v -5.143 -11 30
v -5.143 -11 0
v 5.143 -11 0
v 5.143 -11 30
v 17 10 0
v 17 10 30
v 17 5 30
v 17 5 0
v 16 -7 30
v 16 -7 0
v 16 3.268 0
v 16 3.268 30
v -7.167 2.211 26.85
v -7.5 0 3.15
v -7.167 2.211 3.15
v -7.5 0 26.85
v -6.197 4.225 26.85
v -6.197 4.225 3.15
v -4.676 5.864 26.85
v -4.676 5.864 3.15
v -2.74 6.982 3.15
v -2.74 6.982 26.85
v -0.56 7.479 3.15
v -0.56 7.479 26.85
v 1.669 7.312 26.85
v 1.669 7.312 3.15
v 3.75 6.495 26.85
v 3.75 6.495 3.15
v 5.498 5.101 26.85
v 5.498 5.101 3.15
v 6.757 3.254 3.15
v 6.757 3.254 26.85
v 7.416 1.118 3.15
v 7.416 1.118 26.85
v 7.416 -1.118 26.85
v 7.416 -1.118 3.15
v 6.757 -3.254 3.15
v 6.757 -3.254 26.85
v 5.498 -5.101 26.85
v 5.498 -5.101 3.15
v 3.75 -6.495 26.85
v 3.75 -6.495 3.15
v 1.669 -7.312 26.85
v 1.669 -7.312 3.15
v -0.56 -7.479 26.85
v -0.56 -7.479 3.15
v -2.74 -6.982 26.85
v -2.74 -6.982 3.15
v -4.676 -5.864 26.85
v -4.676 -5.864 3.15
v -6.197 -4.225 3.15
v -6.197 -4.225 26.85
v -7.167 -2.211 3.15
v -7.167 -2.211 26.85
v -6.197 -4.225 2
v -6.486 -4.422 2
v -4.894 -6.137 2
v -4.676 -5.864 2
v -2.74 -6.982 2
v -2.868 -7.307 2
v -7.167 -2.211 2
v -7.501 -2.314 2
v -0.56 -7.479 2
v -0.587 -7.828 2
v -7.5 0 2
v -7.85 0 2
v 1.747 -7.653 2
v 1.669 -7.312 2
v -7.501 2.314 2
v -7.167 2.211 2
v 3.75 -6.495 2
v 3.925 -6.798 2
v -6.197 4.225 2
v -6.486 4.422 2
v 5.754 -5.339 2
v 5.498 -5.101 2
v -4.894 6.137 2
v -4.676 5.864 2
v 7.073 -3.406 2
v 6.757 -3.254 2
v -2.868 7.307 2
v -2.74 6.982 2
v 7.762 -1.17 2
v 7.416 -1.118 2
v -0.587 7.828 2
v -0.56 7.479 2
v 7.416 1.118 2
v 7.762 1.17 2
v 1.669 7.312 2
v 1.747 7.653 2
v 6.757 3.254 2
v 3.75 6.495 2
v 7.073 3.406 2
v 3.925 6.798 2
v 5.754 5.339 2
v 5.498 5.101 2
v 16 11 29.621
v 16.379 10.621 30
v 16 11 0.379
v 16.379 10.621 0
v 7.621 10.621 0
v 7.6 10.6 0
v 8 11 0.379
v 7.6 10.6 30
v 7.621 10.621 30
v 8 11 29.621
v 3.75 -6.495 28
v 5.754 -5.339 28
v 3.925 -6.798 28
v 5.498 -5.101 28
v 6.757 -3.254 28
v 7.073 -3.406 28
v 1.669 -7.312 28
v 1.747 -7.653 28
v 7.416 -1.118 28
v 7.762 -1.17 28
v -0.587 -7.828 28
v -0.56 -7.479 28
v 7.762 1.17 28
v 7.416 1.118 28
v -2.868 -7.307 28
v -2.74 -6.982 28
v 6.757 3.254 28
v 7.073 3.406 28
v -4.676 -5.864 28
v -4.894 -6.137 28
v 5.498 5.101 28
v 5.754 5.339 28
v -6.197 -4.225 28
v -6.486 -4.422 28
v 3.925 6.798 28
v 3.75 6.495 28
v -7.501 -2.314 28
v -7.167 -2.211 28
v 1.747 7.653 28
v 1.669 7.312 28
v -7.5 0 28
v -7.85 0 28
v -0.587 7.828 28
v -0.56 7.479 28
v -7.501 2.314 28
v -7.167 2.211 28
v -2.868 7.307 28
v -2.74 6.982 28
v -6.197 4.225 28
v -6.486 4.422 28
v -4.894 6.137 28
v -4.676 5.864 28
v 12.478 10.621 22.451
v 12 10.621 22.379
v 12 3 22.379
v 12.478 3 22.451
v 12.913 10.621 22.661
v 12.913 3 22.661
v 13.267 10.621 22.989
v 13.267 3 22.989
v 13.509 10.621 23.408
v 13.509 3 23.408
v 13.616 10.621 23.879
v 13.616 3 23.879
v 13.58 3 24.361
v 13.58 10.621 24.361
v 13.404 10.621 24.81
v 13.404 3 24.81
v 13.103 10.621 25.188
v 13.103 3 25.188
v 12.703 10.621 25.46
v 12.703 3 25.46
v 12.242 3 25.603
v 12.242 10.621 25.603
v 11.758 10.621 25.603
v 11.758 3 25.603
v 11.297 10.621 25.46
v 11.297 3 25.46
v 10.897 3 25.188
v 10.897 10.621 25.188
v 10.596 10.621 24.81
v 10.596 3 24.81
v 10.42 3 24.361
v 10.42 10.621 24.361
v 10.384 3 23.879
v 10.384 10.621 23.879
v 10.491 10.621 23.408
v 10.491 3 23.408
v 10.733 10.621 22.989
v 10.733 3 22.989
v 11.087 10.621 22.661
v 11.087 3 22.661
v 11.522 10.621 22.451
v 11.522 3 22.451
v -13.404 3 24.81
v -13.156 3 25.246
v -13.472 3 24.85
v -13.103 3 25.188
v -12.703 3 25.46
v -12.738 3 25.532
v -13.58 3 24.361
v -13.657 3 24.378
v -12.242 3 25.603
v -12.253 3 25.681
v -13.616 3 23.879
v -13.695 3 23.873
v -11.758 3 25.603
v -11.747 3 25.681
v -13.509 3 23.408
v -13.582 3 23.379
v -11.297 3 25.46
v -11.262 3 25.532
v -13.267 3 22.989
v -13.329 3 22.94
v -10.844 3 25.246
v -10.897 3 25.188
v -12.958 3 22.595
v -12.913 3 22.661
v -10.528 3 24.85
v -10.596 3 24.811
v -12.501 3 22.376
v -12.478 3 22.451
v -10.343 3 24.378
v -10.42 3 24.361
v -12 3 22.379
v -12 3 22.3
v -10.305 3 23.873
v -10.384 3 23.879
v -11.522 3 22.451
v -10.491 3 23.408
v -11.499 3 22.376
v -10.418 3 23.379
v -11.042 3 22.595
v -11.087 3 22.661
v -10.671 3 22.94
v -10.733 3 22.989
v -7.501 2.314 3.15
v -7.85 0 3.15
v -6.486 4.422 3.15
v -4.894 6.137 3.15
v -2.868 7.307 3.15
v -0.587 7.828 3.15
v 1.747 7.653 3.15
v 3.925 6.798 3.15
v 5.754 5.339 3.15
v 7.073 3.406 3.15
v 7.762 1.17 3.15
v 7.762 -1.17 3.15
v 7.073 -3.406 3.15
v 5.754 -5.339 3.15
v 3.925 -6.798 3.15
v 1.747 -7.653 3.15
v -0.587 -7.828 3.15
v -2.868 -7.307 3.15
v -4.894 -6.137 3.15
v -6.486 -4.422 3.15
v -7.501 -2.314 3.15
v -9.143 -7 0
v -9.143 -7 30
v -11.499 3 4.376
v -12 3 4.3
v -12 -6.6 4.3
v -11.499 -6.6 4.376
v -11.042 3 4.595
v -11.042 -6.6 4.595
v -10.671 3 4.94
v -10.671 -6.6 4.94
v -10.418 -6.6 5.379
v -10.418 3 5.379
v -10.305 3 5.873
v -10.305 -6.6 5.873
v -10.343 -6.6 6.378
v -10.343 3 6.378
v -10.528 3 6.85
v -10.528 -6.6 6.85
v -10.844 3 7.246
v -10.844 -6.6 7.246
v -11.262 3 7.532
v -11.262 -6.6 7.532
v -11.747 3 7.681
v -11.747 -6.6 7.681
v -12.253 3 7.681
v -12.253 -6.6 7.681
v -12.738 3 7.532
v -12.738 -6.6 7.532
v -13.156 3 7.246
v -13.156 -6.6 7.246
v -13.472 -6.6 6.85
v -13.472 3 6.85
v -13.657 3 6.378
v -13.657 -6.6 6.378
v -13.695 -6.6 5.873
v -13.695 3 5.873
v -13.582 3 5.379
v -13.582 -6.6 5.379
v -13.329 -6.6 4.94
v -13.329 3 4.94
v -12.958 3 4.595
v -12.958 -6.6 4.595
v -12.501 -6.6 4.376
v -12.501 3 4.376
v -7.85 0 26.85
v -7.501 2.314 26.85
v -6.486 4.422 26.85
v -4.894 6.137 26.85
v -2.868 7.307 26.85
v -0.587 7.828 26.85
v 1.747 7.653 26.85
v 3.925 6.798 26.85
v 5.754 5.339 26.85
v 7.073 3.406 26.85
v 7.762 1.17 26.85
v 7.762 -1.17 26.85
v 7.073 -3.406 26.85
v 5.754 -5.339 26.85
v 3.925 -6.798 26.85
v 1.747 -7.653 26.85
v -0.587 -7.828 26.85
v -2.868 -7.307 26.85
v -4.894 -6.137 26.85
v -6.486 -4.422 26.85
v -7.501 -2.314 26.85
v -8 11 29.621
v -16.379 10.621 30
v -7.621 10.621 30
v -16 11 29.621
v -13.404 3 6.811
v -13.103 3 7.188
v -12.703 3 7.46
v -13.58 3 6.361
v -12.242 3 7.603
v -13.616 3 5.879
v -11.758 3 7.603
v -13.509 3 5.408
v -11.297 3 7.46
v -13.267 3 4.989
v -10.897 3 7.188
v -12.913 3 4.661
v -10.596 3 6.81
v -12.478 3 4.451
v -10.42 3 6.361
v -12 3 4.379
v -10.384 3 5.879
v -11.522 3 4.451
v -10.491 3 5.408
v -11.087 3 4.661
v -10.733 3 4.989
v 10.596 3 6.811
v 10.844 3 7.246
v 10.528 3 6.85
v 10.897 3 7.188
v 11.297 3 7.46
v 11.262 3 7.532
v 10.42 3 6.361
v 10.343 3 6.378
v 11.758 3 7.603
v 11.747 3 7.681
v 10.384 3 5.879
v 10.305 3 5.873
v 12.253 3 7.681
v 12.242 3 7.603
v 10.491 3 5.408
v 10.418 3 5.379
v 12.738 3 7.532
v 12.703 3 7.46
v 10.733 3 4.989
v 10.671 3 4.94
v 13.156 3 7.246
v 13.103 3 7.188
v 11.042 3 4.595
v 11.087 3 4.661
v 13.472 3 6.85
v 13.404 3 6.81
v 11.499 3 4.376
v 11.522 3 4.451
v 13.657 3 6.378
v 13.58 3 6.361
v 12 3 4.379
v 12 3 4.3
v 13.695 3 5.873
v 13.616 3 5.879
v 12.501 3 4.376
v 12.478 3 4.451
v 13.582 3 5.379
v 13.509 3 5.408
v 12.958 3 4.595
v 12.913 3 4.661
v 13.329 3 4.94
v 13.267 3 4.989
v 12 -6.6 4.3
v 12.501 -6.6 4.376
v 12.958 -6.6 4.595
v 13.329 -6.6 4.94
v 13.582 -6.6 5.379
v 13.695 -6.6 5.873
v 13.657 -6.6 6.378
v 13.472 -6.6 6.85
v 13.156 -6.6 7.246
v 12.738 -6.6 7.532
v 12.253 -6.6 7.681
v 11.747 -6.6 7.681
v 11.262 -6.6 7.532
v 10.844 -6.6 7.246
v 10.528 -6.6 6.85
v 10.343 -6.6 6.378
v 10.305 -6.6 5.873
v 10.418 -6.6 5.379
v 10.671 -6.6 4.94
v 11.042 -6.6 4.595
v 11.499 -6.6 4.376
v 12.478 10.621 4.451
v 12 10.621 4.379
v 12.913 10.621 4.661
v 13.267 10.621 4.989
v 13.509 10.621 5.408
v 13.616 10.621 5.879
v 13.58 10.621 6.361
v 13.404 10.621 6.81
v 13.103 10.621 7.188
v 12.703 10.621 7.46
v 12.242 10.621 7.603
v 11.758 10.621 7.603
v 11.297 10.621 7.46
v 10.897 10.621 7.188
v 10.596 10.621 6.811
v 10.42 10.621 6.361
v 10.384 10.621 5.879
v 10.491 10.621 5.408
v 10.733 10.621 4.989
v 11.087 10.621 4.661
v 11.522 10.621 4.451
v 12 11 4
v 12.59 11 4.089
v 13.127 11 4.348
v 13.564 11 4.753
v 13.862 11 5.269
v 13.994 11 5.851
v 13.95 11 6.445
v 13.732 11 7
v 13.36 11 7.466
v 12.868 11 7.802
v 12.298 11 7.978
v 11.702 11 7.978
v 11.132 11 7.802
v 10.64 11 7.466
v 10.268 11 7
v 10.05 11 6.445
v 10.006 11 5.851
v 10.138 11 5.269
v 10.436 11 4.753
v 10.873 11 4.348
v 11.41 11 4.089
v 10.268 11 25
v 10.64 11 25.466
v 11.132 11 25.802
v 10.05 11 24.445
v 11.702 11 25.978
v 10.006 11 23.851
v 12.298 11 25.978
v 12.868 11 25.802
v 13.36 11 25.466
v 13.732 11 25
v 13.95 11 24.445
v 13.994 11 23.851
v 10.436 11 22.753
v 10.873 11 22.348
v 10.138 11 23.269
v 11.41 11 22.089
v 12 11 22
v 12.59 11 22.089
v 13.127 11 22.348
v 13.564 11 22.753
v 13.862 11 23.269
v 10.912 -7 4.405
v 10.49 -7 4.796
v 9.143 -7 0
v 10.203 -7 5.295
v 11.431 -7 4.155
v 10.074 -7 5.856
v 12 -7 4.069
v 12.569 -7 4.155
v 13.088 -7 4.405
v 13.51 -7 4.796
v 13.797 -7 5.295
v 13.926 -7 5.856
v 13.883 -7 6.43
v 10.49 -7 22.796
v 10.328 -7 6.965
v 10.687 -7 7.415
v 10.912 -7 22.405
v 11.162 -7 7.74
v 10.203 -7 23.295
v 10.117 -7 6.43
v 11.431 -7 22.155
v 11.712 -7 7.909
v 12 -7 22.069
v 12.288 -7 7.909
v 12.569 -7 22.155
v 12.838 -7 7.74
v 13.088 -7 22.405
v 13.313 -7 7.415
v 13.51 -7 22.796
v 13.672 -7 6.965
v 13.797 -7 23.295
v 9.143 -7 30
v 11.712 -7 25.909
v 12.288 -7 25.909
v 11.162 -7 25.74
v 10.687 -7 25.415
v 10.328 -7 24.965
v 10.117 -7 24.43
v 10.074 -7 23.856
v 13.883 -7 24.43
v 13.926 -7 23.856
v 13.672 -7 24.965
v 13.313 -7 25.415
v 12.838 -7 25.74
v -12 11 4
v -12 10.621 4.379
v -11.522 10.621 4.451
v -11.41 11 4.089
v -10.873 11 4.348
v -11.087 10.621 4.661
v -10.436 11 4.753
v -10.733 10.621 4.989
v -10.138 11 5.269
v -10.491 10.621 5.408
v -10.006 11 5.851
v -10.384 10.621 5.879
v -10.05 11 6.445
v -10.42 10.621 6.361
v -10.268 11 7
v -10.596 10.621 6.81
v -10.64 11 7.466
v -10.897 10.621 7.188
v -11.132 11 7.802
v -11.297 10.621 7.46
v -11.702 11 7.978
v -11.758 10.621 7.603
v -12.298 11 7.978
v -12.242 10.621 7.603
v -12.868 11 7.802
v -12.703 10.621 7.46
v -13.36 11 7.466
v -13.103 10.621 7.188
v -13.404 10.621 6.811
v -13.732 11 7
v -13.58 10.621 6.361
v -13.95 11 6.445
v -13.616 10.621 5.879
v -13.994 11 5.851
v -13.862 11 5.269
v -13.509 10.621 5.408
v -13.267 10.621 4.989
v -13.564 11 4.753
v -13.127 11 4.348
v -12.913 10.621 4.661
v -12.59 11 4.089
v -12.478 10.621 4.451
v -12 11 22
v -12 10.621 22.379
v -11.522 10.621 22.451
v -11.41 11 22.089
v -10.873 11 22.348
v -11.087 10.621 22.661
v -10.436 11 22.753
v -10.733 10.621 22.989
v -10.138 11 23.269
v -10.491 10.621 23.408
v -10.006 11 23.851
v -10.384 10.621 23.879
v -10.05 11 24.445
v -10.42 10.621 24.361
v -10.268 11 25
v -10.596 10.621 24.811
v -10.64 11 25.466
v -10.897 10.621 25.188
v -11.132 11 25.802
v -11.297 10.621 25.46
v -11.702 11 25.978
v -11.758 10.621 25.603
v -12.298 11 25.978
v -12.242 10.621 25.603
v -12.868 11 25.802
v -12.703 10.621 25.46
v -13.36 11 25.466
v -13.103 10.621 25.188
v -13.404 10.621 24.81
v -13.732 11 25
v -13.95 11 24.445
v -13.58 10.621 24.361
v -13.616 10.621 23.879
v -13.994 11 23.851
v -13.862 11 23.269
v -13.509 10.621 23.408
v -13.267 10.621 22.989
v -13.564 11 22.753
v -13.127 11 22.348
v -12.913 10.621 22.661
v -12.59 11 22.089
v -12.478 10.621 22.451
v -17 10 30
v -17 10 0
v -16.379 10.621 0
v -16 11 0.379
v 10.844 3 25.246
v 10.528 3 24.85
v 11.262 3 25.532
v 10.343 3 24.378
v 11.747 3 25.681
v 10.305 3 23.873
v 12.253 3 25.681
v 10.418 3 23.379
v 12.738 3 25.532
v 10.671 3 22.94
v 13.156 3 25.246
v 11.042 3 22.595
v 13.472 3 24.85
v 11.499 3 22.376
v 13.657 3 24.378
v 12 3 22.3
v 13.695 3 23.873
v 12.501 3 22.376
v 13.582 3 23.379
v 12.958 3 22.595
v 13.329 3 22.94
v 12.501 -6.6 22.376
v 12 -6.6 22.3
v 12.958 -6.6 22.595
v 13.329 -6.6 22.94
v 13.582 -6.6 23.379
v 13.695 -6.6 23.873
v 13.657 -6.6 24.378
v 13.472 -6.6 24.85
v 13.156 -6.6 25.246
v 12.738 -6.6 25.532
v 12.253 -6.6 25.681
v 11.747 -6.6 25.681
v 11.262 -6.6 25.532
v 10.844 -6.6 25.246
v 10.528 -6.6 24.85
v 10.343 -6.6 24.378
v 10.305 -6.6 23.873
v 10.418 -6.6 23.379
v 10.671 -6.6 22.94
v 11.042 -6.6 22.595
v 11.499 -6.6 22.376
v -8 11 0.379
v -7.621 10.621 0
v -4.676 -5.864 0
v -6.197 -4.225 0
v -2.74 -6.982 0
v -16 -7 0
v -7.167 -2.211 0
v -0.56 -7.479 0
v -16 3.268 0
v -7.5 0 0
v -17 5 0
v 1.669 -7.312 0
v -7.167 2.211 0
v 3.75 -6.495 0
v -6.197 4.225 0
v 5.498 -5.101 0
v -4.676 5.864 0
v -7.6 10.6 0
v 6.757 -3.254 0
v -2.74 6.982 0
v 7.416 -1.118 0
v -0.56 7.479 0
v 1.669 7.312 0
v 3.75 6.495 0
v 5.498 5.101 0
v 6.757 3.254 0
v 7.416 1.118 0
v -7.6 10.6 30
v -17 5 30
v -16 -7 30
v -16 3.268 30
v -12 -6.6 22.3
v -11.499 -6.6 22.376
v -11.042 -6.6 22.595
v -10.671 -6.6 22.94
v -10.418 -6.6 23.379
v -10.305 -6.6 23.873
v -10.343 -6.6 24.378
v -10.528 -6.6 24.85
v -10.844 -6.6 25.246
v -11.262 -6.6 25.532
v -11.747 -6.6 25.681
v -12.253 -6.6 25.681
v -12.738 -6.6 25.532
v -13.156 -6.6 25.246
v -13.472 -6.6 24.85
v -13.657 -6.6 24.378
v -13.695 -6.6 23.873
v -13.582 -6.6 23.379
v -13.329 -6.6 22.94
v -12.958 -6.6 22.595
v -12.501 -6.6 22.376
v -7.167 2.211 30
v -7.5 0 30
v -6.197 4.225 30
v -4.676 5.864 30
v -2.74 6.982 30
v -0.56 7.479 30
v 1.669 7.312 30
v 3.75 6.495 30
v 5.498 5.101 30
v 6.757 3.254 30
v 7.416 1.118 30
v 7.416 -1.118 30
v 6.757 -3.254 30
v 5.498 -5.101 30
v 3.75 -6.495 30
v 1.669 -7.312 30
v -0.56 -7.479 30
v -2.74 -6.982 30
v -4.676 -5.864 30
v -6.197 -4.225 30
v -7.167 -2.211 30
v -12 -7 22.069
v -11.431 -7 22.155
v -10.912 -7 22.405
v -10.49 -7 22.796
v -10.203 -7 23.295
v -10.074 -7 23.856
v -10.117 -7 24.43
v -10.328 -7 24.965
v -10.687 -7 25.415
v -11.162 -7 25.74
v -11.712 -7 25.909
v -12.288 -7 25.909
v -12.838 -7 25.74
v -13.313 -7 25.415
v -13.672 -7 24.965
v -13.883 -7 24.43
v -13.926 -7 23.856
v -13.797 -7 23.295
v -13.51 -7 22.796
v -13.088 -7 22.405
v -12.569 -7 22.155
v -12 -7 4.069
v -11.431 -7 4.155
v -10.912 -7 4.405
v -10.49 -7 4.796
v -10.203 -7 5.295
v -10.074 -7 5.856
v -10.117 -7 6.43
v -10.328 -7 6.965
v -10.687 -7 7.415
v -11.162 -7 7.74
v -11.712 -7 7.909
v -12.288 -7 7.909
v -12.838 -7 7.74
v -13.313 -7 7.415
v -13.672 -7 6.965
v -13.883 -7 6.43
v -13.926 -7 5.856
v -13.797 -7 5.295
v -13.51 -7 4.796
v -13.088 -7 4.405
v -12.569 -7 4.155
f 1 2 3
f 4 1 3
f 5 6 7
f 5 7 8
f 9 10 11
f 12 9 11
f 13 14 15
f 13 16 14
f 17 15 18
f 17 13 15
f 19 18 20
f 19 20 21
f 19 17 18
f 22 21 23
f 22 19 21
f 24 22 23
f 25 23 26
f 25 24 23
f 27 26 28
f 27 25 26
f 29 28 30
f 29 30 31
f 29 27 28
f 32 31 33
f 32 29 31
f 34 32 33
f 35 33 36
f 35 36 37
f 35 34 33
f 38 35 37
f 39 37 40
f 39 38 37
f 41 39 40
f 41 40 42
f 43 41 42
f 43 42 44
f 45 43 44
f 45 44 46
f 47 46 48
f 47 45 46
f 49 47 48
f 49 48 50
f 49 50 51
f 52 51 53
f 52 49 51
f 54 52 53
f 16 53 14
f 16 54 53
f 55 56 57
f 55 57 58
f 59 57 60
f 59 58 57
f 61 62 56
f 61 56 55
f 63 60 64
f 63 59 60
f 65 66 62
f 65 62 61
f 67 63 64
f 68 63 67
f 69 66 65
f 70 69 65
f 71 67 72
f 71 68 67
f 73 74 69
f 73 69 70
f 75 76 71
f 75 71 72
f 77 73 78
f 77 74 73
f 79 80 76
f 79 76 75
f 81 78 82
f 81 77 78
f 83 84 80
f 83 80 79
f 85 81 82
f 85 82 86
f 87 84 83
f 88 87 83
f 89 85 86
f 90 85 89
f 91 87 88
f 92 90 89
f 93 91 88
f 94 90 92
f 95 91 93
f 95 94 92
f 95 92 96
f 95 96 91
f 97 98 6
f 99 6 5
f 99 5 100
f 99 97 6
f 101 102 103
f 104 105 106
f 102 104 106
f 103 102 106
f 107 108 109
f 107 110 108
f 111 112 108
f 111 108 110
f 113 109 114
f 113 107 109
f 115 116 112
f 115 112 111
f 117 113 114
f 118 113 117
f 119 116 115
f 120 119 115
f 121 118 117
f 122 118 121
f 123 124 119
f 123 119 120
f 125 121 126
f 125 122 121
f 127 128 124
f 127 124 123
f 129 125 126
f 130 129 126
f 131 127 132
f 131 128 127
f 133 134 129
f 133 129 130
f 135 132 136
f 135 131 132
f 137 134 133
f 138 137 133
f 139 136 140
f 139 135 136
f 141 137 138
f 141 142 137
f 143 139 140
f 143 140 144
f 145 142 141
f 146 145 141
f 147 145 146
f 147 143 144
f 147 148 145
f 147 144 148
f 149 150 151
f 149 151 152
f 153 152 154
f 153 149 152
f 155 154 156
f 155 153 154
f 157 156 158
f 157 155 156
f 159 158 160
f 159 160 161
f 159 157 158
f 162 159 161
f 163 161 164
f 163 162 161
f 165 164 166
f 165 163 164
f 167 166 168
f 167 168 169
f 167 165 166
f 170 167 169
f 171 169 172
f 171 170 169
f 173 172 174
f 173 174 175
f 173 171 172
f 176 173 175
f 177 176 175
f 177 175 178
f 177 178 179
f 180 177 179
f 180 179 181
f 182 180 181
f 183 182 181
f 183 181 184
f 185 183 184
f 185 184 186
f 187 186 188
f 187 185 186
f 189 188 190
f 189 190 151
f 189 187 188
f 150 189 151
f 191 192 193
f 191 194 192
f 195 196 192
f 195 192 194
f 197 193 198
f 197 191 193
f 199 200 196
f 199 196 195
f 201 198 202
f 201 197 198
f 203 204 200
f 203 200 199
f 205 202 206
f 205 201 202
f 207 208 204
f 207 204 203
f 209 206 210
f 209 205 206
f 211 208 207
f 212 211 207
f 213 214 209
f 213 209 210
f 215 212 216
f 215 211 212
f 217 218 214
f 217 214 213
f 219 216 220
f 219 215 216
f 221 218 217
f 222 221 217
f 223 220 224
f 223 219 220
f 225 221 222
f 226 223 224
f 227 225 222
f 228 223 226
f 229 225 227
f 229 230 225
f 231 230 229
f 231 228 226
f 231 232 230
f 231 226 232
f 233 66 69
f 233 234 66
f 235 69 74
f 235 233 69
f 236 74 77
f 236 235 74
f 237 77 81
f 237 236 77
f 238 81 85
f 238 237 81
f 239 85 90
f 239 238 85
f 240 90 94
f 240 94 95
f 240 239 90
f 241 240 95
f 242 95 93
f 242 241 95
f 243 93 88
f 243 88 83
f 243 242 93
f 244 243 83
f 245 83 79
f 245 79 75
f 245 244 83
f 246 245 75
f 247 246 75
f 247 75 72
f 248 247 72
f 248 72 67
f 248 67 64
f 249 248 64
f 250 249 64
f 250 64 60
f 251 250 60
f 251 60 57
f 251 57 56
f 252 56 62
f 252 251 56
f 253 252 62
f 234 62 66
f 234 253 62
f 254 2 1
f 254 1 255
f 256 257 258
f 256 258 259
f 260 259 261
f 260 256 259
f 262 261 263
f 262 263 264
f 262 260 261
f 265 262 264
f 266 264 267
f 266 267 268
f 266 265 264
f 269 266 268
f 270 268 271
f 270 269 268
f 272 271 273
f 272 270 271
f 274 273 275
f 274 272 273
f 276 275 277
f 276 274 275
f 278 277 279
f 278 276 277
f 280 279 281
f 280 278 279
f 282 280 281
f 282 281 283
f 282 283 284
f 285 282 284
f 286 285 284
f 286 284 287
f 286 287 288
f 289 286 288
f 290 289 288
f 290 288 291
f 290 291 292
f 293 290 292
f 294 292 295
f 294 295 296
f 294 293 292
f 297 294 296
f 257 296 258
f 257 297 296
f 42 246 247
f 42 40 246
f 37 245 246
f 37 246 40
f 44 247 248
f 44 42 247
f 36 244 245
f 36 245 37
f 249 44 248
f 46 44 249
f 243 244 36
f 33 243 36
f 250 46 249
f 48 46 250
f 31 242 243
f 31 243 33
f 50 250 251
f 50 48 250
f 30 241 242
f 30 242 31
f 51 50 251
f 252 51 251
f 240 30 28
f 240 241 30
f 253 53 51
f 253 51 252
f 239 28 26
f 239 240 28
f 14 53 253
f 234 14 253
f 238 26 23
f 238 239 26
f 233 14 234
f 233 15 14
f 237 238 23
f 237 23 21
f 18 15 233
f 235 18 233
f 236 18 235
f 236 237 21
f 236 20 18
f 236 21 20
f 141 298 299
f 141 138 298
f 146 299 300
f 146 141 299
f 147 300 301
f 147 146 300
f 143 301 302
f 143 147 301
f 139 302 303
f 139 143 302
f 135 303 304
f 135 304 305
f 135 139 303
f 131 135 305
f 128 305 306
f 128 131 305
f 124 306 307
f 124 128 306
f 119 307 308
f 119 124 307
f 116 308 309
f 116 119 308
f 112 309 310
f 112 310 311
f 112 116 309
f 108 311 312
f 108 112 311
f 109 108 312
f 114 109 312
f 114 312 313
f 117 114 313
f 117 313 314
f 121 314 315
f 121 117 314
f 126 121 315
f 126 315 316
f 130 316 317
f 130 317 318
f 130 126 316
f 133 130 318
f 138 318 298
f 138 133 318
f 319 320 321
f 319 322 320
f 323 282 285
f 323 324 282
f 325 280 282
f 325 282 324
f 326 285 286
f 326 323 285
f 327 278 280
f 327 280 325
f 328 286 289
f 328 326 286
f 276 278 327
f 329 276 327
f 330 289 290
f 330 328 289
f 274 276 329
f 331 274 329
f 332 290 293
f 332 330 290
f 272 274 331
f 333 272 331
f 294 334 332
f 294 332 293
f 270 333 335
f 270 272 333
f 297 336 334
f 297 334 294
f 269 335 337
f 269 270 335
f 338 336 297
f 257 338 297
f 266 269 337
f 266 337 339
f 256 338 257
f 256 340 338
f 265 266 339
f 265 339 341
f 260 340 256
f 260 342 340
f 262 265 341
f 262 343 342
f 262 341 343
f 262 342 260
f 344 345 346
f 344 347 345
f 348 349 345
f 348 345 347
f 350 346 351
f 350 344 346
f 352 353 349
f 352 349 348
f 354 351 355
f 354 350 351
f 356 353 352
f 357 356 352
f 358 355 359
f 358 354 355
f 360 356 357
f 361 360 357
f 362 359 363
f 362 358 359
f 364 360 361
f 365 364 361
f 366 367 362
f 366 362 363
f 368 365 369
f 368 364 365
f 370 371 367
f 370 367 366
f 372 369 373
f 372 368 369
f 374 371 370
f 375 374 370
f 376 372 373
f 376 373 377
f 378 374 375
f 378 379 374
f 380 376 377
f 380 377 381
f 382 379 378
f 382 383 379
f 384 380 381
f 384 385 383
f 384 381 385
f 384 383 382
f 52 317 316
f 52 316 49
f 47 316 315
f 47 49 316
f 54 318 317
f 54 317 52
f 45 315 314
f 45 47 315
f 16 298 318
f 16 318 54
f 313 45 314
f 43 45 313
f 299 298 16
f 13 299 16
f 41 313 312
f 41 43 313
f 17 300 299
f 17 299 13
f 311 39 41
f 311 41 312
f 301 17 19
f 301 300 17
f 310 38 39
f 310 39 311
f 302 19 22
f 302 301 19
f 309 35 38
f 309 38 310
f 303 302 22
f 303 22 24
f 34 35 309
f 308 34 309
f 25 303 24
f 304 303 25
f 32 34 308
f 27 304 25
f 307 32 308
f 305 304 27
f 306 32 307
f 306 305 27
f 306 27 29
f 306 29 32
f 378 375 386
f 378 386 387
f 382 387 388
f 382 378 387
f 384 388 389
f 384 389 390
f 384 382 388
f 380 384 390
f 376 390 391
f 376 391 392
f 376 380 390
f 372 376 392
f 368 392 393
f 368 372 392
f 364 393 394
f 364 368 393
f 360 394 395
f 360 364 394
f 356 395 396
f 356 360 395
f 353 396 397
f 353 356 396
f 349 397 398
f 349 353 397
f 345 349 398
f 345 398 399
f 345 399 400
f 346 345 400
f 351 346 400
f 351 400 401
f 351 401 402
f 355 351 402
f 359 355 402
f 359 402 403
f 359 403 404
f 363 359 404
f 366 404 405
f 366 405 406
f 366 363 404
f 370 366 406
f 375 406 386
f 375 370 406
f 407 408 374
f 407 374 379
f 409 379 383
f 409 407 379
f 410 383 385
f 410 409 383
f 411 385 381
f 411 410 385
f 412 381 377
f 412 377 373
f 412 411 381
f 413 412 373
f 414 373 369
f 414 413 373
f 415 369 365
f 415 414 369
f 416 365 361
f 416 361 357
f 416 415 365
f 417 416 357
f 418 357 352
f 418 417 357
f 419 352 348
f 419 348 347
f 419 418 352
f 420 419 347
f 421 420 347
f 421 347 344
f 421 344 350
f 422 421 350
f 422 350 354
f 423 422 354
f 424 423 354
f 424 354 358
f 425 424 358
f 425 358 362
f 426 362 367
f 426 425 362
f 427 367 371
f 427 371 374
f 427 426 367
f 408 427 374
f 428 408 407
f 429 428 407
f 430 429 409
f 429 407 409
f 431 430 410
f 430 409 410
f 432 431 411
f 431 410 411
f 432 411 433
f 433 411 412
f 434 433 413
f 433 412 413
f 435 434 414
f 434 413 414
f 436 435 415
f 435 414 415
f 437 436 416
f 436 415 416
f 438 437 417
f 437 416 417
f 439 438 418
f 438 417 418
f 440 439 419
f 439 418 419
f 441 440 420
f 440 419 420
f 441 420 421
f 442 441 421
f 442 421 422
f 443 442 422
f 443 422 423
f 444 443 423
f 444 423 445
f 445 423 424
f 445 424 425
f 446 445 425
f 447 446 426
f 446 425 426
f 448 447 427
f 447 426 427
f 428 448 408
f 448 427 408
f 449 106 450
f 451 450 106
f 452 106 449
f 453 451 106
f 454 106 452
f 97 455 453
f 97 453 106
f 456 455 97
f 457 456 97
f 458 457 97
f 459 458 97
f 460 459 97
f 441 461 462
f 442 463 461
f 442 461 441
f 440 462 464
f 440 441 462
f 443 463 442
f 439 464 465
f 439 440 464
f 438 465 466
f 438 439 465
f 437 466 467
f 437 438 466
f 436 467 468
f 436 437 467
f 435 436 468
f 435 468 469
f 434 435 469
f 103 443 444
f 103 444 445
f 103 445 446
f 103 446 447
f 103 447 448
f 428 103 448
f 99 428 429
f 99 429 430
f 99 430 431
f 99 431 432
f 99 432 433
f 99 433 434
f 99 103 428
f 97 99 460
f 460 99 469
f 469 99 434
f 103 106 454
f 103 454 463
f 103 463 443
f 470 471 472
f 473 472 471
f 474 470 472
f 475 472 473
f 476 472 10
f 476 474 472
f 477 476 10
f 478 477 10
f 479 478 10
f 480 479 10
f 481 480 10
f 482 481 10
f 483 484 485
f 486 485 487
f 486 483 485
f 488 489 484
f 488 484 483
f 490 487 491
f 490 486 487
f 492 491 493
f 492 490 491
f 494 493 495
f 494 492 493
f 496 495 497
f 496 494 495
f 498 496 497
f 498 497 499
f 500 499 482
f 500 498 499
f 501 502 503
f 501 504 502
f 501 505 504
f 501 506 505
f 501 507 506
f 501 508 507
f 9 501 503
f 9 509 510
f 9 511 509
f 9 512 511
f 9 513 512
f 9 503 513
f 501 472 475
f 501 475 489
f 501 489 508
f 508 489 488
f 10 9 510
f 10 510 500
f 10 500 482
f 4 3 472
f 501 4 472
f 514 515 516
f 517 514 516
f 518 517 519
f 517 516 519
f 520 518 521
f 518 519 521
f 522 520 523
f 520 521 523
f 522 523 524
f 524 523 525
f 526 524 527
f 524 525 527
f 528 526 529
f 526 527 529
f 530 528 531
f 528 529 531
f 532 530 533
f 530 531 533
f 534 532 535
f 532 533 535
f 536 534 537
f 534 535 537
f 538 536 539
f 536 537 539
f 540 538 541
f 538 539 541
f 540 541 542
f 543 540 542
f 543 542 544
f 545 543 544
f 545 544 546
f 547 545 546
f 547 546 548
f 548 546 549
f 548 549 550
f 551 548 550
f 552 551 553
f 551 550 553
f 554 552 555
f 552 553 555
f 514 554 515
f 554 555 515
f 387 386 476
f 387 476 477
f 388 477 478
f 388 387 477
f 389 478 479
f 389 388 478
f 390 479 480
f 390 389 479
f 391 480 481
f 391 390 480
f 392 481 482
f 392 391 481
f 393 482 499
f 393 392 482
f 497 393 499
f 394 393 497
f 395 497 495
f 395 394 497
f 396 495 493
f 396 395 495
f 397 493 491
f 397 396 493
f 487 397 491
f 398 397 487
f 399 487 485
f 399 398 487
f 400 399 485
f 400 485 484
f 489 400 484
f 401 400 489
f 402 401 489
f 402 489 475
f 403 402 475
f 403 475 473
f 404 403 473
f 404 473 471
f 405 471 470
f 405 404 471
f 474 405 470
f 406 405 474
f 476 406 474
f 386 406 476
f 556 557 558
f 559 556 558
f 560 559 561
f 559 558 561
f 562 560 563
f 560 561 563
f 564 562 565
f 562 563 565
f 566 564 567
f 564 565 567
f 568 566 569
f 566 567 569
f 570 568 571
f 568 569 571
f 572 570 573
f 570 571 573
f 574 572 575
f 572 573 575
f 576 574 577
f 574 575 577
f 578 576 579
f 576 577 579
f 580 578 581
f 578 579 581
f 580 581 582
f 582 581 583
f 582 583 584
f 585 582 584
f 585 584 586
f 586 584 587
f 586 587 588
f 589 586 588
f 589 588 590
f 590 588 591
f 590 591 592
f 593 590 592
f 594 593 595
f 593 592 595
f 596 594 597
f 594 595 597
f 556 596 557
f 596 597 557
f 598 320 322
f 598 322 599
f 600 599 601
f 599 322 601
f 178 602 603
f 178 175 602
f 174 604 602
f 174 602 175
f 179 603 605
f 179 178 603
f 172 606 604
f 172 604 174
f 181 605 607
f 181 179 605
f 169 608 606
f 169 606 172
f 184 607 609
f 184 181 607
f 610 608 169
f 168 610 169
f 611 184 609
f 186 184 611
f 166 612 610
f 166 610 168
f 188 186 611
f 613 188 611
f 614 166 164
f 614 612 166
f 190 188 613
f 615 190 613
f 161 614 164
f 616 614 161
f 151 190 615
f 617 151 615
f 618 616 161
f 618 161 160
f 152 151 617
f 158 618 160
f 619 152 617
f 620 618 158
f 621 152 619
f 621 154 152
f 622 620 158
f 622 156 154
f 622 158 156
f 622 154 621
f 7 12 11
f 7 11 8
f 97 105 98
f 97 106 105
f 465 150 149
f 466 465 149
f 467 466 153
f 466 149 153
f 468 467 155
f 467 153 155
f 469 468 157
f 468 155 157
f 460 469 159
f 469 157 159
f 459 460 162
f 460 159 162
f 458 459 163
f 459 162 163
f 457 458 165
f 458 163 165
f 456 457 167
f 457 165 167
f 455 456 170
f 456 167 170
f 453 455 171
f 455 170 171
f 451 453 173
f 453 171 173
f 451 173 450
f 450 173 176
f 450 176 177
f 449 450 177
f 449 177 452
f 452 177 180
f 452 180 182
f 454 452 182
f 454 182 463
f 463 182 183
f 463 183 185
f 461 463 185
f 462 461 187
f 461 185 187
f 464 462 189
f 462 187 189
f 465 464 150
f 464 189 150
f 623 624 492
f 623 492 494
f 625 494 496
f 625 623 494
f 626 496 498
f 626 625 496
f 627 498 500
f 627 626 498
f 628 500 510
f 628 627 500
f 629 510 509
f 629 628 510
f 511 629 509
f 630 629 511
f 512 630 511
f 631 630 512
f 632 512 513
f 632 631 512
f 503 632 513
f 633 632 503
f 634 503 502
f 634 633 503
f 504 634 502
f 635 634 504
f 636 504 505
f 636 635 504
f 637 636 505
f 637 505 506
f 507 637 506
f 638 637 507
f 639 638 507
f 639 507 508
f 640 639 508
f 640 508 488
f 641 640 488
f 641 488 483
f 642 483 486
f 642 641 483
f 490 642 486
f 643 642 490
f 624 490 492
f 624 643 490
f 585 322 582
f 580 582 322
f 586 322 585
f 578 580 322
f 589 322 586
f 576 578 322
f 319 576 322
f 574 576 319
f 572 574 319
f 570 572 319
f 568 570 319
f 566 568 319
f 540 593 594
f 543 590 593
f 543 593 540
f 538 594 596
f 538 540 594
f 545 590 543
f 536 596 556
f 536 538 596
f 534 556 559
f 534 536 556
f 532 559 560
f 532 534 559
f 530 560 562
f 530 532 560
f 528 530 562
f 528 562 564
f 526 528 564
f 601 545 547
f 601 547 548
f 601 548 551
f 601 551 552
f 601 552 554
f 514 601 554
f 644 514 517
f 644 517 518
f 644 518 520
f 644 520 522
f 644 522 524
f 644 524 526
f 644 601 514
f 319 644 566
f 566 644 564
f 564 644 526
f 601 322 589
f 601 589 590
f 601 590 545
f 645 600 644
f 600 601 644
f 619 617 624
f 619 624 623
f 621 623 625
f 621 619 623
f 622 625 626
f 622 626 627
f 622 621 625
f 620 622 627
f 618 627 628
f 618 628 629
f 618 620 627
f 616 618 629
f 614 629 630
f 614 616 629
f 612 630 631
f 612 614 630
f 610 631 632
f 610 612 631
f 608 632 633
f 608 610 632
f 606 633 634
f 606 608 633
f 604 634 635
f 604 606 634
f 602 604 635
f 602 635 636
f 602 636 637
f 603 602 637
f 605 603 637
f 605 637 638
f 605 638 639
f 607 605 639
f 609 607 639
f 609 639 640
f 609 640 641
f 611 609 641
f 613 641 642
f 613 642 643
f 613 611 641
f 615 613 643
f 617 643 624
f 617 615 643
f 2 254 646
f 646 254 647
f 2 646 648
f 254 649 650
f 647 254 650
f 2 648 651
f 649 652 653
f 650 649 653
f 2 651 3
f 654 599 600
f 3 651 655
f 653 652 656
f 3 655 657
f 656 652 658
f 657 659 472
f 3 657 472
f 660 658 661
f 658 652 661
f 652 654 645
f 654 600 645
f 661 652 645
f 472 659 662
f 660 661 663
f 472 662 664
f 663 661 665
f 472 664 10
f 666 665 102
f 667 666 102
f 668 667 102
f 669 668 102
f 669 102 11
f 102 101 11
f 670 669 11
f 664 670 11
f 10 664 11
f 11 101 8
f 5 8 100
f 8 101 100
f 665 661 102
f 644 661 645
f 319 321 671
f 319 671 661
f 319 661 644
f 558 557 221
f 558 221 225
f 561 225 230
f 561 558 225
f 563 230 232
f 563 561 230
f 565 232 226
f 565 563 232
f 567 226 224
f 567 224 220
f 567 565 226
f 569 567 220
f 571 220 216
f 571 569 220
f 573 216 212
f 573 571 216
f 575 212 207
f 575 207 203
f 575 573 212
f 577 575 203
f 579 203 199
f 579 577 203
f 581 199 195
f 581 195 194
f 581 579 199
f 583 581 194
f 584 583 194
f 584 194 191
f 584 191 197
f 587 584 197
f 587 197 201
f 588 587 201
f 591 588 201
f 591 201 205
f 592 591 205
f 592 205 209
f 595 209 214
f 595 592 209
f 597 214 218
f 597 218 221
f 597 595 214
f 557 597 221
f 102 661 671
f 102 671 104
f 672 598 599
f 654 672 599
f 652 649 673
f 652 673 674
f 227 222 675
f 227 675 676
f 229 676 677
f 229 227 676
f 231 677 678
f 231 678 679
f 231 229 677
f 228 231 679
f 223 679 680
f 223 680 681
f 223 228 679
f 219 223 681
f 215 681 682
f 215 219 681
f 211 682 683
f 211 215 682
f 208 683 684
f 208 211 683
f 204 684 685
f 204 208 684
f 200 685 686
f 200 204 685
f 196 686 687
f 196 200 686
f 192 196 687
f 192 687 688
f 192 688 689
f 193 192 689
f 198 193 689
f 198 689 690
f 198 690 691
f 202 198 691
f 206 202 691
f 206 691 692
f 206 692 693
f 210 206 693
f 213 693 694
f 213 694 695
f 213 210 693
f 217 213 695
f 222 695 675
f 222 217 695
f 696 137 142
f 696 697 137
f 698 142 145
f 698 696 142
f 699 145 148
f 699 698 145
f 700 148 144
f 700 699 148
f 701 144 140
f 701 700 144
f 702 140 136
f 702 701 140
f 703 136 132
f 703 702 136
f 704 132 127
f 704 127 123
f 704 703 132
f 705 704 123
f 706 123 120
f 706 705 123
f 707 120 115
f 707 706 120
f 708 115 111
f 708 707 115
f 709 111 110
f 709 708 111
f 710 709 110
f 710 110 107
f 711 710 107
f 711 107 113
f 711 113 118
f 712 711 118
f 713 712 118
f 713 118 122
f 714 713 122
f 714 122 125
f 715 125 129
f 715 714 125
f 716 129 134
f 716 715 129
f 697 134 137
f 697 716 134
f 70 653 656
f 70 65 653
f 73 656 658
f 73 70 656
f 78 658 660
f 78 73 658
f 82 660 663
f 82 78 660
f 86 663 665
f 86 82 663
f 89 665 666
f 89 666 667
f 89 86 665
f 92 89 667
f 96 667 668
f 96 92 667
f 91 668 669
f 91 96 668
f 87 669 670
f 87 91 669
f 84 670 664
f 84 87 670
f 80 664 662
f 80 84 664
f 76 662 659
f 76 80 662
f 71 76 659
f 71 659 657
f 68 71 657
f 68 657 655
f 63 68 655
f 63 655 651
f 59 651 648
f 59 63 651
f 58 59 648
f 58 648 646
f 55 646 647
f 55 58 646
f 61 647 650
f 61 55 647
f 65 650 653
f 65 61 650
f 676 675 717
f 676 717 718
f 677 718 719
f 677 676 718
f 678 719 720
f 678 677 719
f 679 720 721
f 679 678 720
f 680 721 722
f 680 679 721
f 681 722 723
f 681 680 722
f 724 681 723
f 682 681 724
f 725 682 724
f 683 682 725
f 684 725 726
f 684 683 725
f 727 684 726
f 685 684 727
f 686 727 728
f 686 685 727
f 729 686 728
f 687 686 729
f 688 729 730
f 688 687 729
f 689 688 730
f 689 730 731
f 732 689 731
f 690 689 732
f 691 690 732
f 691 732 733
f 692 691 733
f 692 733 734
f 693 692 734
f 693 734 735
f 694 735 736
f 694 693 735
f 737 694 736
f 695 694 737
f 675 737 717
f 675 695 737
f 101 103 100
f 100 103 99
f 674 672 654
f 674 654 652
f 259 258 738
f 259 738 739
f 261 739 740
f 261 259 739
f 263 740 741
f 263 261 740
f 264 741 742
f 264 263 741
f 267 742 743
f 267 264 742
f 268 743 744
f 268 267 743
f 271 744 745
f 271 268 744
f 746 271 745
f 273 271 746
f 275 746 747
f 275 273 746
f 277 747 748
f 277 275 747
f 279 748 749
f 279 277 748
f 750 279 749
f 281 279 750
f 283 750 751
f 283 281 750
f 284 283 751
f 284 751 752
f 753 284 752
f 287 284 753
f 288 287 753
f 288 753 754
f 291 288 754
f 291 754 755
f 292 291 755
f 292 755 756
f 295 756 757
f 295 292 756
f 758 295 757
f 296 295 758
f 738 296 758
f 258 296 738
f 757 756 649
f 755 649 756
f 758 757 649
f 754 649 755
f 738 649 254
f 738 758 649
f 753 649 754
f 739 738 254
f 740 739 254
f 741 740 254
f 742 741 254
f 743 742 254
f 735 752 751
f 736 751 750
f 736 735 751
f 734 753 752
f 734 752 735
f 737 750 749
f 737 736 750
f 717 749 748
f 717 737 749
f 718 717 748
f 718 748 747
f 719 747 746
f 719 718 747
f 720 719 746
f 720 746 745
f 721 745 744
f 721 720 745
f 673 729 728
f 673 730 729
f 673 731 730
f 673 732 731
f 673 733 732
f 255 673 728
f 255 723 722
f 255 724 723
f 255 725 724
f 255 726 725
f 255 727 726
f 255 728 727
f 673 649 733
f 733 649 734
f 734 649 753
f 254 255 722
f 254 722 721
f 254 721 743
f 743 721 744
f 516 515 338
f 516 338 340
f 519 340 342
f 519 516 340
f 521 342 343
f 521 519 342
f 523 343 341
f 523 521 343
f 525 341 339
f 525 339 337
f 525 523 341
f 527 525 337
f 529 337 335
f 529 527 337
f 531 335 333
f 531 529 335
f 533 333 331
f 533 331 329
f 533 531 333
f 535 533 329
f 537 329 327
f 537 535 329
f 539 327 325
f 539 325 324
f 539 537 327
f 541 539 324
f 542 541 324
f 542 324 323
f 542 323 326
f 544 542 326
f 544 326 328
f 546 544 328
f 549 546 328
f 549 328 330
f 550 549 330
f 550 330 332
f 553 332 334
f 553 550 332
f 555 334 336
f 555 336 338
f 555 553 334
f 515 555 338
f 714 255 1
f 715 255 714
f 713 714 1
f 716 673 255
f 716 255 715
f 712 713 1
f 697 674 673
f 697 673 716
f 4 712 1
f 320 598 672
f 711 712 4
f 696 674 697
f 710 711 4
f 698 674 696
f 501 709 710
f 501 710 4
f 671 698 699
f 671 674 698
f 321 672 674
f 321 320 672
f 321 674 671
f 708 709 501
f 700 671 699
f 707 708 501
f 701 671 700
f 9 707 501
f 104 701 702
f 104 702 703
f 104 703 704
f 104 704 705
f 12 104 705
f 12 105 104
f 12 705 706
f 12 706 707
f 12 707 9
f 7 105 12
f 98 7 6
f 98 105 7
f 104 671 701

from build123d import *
from OCP.BRepFilletAPI import BRepFilletAPI_MakeChamfer

# Parameters (mm, degrees)
SCHIZZO1_W                   = 34
SCHIZZO1_H                   = 30
ESTRUSIONE_ESTRUSIONE1_DEPTH = 22
SCHIZZO2_W                   = 1
SCHIZZO2_H                   = 14.267949192
TAGLIO_ESTRUSIONE1_DEPTH     = 37.193922142
SCHIZZO3_W                   = 10.8571
SCHIZZO3_H                   = 4
TAGLIO_ESTRUSIONE2_DEPTH     = 37.193922142
SCHIZZO4_W                   = 11.8571
SCHIZZO4_H                   = 4
TAGLIO_ESTRUSIONE3_DEPTH     = 37.193922142
SCHIZZO5_W                   = 1
SCHIZZO5_H                   = 10.267949192
TAGLIO_ESTRUSIONE4_DEPTH     = 37.193922142
SCHIZZO6_W                   = 15.2
SCHIZZO6_H                   = 0.4
TAGLIO_ESTRUSIONE5_DEPTH     = 37.193922142
SFORMO1_ANGLE                = 60
SFORMO2_ANGLE                = 60
SFORMO3_ANGLE                = 45
SFORMO4_ANGLE                = 45
SMUSSO1_SIZE                 = 0.230940108
SMUSSO1_SIZE2                = 0.4
SMUSSO2_SIZE                 = 0.379
SMUSSO3_SIZE                 = 1


with BuildPart() as part:
    # Schizzo1 → Estrusione-Estrusione1 (new body)
    with BuildSketch(Plane(origin=(0, 11, 0), x_dir=(1, 0, 0), z_dir=(0, 1, 0))):
        with Locations((0, -15)):
            Rectangle(SCHIZZO1_W, SCHIZZO1_H)
    extrude(amount=-ESTRUSIONE_ESTRUSIONE1_DEPTH)

    # Schizzo2 → Taglio-Estrusione1 (cut, through all)
    with BuildSketch(Plane.XY.offset(30)):
        with Locations((16.5, -3.866025404)):
            Rectangle(SCHIZZO2_W, SCHIZZO2_H)
    extrude(amount=-TAGLIO_ESTRUSIONE1_DEPTH, mode=Mode.SUBTRACT)

    # Schizzo3 → Taglio-Estrusione2 (cut, through all)
    with BuildSketch(Plane.XY.offset(30)):
        with Locations((10.57145, -9)):
            Rectangle(SCHIZZO3_W, SCHIZZO3_H)
    extrude(amount=-TAGLIO_ESTRUSIONE2_DEPTH, mode=Mode.SUBTRACT)

    # Schizzo4 → Taglio-Estrusione3 (cut, through all)
    with BuildSketch(Plane.XY.offset(30)):
        with Locations((-11.07145, -9)):
            Rectangle(SCHIZZO4_W, SCHIZZO4_H)
    extrude(amount=-TAGLIO_ESTRUSIONE3_DEPTH, mode=Mode.SUBTRACT)

    # Schizzo5 → Taglio-Estrusione4 (cut, through all)
    with BuildSketch(Plane.XY.offset(30)):
        with Locations((-16.5, -1.866025404)):
            Rectangle(SCHIZZO5_W, SCHIZZO5_H)
    extrude(amount=-TAGLIO_ESTRUSIONE4_DEPTH, mode=Mode.SUBTRACT)

    # Schizzo6 → Taglio-Estrusione5 (cut, through all)
    with BuildSketch(Plane.XY.offset(30)):
        with Locations((0, 10.8)):
            Rectangle(SCHIZZO6_W, SCHIZZO6_H)
    extrude(amount=-TAGLIO_ESTRUSIONE5_DEPTH, mode=Mode.SUBTRACT)

    # Sformo1
    sformo1_faces = [part.faces().sort_by_distance(p)[0] for p in [
        (16.5, 3.267949192, 15),
    ]]
    draft(sformo1_faces, Plane(origin=(16, 3.267949192, 0), x_dir=(0, 0, 1), z_dir=(1, 0, 0)), SFORMO1_ANGLE)

    # Sformo2
    sformo2_faces = [part.faces().sort_by_distance(p)[0] for p in [
        (-16.5, 3.267949192, 15),
    ]]
    draft(sformo2_faces, Plane(origin=(-16, -7, 0), x_dir=(0, 0, -1), z_dir=(-1, 0, 0)), SFORMO2_ANGLE)

    # Sformo3
    sformo3_faces = [part.faces().sort_by_distance(p)[0] for p in [
        (5.1429, -9, 15),
        (-5.1429, -9, 15),
    ]]
    draft(sformo3_faces, Plane(origin=(0, -11, 0), x_dir=(0, 0, -1), z_dir=(0, -1, 0)), SFORMO3_ANGLE)

    # Sformo4
    sformo4_faces = [part.faces().sort_by_distance(p)[0] for p in [
        (-7.6, 10.8, 15),
        (7.6, 10.8, 15),
    ]]
    draft(sformo4_faces, Plane(origin=(-7.6, 10.6, 0), x_dir=(1, 0, 0), z_dir=(0, 1, 0)), SFORMO4_ANGLE)

    # Schizzo7 → Taglia-Rivoluzione1 (revolve, cut)
    with BuildSketch(Plane.XZ, mode=Mode.PRIVATE) as taglia_rivoluzione1_sk:
        Polygon((7.5, 30), (0, 30), (0, 0), (7.5, 0), (7.5, 2), (7.85, 2), (7.85, 3.15), (7.5, 3.15), (7.5, 26.85), (7.85, 26.85), (7.85, 28), (7.5, 28), align=None)
    revolve(taglia_rivoluzione1_sk.sketch.rotate(Axis((0, 0, 30), (0, 0, -1)), 180), axis=Axis((0, 0, 30), (0, 0, -1)), mode=Mode.SUBTRACT)

    # Schizzo8 → Taglia-Rivoluzione2 (revolve, cut)
    with BuildSketch(Plane.XY.offset(6), mode=Mode.PRIVATE) as taglia_rivoluzione2_sk:
        Polygon((-10.379, 11), (-12, 11), (-12, -7), (-10.3, -7), (-10.3, 3), (-10.379, 3), align=None)
    revolve(taglia_rivoluzione2_sk.sketch.rotate(Axis((-12, 11, 6), (0, -1, 0)), 270), axis=Axis((-12, 11, 6), (0, -1, 0)), mode=Mode.SUBTRACT)

    # Schizzo9 → Taglia-Rivoluzione3 (revolve, cut)
    with BuildSketch(Plane.XY.offset(24), mode=Mode.PRIVATE) as taglia_rivoluzione3_sk:
        Polygon((-10.379, 11), (-12, 11), (-12, -7), (-10.3, -7), (-10.3, 3), (-10.379, 3), align=None)
    revolve(taglia_rivoluzione3_sk.sketch.rotate(Axis((-12, 11, 24), (0, -1, 0)), 270), axis=Axis((-12, 11, 24), (0, -1, 0)), mode=Mode.SUBTRACT)

    # Schizzo10 → Taglia-Rivoluzione4 (revolve, cut)
    with BuildSketch(Plane.XY.offset(6), mode=Mode.PRIVATE) as taglia_rivoluzione4_sk:
        Polygon((13.621, 11), (12, 11), (12, -7), (13.7, -7), (13.7, 3), (13.621, 3), align=None)
    revolve(taglia_rivoluzione4_sk.sketch.rotate(Axis((12, 11, 6), (0, -1, 0)), 270), axis=Axis((12, 11, 6), (0, -1, 0)), mode=Mode.SUBTRACT)

    # Schizzo11 → Taglia-Rivoluzione5 (revolve, cut)
    with BuildSketch(Plane.XY.offset(24), mode=Mode.PRIVATE) as taglia_rivoluzione5_sk:
        Polygon((13.621, 11), (12, 11), (12, -7), (13.7, -7), (13.7, 3), (13.621, 3), align=None)
    revolve(taglia_rivoluzione5_sk.sketch.rotate(Axis((12, 11, 24), (0, -1, 0)), 270), axis=Axis((12, 11, 24), (0, -1, 0)), mode=Mode.SUBTRACT)

    # Smusso1: one chamfer whose edges measure the first distance from different faces: ONE call of the kernel's chamfer builder (chamfer() names one face for all edges)
    smusso1_edges_1 = [part.edges().sort_by_distance(p)[0] for p in [
        (-12, -7, 7.7),
        (-12, -7, 25.7),
    ]]
    smusso1_side_1 = [part.faces().sort_by_distance(p)[0] for p in [
        (-12.626775869, -7, 15),
    ]]
    smusso1_edges_2 = [part.edges().sort_by_distance(p)[0] for p in [
        (12, -7, 7.7),
        (12, -7, 25.7),
    ]]
    smusso1_side_2 = [part.faces().sort_by_distance(p)[0] for p in [
        (12.626775869, -7, 15),
    ]]
    smusso1 = BRepFilletAPI_MakeChamfer(part.part.solid().wrapped)
    for e in smusso1_edges_1:
        smusso1.Add(SMUSSO1_SIZE, SMUSSO1_SIZE2, e.wrapped, smusso1_side_1[0].wrapped)  # the first distance lies on this face
    for e in smusso1_edges_2:
        smusso1.Add(SMUSSO1_SIZE, SMUSSO1_SIZE2, e.wrapped, smusso1_side_2[0].wrapped)  # the first distance lies on this face
    add(Compound.cast(smusso1.Shape()), mode=Mode.REPLACE)

    # Smusso2
    smusso2_edges = [part.edges().sort_by_distance(p)[0] for p in [
        (-12, 11, 7.621),
        (-12, 11, 25.621),
        (12, 11, 7.621),
        (12, 11, 25.621),
        (-12.5, 11, 30),
        (12.5, 11, 0),
        (-12.5, 11, 0),
        (12.5, 11, 30),
    ]]
    chamfer(smusso2_edges, length=SMUSSO2_SIZE)

    # Smusso3
    smusso3_edges = [part.edges().sort_by_distance(p)[0] for p in [
        (17, 11, 15),
        (-17, 11, 15),
    ]]
    chamfer(smusso3_edges, length=SMUSSO3_SIZE)


solid = part.part
